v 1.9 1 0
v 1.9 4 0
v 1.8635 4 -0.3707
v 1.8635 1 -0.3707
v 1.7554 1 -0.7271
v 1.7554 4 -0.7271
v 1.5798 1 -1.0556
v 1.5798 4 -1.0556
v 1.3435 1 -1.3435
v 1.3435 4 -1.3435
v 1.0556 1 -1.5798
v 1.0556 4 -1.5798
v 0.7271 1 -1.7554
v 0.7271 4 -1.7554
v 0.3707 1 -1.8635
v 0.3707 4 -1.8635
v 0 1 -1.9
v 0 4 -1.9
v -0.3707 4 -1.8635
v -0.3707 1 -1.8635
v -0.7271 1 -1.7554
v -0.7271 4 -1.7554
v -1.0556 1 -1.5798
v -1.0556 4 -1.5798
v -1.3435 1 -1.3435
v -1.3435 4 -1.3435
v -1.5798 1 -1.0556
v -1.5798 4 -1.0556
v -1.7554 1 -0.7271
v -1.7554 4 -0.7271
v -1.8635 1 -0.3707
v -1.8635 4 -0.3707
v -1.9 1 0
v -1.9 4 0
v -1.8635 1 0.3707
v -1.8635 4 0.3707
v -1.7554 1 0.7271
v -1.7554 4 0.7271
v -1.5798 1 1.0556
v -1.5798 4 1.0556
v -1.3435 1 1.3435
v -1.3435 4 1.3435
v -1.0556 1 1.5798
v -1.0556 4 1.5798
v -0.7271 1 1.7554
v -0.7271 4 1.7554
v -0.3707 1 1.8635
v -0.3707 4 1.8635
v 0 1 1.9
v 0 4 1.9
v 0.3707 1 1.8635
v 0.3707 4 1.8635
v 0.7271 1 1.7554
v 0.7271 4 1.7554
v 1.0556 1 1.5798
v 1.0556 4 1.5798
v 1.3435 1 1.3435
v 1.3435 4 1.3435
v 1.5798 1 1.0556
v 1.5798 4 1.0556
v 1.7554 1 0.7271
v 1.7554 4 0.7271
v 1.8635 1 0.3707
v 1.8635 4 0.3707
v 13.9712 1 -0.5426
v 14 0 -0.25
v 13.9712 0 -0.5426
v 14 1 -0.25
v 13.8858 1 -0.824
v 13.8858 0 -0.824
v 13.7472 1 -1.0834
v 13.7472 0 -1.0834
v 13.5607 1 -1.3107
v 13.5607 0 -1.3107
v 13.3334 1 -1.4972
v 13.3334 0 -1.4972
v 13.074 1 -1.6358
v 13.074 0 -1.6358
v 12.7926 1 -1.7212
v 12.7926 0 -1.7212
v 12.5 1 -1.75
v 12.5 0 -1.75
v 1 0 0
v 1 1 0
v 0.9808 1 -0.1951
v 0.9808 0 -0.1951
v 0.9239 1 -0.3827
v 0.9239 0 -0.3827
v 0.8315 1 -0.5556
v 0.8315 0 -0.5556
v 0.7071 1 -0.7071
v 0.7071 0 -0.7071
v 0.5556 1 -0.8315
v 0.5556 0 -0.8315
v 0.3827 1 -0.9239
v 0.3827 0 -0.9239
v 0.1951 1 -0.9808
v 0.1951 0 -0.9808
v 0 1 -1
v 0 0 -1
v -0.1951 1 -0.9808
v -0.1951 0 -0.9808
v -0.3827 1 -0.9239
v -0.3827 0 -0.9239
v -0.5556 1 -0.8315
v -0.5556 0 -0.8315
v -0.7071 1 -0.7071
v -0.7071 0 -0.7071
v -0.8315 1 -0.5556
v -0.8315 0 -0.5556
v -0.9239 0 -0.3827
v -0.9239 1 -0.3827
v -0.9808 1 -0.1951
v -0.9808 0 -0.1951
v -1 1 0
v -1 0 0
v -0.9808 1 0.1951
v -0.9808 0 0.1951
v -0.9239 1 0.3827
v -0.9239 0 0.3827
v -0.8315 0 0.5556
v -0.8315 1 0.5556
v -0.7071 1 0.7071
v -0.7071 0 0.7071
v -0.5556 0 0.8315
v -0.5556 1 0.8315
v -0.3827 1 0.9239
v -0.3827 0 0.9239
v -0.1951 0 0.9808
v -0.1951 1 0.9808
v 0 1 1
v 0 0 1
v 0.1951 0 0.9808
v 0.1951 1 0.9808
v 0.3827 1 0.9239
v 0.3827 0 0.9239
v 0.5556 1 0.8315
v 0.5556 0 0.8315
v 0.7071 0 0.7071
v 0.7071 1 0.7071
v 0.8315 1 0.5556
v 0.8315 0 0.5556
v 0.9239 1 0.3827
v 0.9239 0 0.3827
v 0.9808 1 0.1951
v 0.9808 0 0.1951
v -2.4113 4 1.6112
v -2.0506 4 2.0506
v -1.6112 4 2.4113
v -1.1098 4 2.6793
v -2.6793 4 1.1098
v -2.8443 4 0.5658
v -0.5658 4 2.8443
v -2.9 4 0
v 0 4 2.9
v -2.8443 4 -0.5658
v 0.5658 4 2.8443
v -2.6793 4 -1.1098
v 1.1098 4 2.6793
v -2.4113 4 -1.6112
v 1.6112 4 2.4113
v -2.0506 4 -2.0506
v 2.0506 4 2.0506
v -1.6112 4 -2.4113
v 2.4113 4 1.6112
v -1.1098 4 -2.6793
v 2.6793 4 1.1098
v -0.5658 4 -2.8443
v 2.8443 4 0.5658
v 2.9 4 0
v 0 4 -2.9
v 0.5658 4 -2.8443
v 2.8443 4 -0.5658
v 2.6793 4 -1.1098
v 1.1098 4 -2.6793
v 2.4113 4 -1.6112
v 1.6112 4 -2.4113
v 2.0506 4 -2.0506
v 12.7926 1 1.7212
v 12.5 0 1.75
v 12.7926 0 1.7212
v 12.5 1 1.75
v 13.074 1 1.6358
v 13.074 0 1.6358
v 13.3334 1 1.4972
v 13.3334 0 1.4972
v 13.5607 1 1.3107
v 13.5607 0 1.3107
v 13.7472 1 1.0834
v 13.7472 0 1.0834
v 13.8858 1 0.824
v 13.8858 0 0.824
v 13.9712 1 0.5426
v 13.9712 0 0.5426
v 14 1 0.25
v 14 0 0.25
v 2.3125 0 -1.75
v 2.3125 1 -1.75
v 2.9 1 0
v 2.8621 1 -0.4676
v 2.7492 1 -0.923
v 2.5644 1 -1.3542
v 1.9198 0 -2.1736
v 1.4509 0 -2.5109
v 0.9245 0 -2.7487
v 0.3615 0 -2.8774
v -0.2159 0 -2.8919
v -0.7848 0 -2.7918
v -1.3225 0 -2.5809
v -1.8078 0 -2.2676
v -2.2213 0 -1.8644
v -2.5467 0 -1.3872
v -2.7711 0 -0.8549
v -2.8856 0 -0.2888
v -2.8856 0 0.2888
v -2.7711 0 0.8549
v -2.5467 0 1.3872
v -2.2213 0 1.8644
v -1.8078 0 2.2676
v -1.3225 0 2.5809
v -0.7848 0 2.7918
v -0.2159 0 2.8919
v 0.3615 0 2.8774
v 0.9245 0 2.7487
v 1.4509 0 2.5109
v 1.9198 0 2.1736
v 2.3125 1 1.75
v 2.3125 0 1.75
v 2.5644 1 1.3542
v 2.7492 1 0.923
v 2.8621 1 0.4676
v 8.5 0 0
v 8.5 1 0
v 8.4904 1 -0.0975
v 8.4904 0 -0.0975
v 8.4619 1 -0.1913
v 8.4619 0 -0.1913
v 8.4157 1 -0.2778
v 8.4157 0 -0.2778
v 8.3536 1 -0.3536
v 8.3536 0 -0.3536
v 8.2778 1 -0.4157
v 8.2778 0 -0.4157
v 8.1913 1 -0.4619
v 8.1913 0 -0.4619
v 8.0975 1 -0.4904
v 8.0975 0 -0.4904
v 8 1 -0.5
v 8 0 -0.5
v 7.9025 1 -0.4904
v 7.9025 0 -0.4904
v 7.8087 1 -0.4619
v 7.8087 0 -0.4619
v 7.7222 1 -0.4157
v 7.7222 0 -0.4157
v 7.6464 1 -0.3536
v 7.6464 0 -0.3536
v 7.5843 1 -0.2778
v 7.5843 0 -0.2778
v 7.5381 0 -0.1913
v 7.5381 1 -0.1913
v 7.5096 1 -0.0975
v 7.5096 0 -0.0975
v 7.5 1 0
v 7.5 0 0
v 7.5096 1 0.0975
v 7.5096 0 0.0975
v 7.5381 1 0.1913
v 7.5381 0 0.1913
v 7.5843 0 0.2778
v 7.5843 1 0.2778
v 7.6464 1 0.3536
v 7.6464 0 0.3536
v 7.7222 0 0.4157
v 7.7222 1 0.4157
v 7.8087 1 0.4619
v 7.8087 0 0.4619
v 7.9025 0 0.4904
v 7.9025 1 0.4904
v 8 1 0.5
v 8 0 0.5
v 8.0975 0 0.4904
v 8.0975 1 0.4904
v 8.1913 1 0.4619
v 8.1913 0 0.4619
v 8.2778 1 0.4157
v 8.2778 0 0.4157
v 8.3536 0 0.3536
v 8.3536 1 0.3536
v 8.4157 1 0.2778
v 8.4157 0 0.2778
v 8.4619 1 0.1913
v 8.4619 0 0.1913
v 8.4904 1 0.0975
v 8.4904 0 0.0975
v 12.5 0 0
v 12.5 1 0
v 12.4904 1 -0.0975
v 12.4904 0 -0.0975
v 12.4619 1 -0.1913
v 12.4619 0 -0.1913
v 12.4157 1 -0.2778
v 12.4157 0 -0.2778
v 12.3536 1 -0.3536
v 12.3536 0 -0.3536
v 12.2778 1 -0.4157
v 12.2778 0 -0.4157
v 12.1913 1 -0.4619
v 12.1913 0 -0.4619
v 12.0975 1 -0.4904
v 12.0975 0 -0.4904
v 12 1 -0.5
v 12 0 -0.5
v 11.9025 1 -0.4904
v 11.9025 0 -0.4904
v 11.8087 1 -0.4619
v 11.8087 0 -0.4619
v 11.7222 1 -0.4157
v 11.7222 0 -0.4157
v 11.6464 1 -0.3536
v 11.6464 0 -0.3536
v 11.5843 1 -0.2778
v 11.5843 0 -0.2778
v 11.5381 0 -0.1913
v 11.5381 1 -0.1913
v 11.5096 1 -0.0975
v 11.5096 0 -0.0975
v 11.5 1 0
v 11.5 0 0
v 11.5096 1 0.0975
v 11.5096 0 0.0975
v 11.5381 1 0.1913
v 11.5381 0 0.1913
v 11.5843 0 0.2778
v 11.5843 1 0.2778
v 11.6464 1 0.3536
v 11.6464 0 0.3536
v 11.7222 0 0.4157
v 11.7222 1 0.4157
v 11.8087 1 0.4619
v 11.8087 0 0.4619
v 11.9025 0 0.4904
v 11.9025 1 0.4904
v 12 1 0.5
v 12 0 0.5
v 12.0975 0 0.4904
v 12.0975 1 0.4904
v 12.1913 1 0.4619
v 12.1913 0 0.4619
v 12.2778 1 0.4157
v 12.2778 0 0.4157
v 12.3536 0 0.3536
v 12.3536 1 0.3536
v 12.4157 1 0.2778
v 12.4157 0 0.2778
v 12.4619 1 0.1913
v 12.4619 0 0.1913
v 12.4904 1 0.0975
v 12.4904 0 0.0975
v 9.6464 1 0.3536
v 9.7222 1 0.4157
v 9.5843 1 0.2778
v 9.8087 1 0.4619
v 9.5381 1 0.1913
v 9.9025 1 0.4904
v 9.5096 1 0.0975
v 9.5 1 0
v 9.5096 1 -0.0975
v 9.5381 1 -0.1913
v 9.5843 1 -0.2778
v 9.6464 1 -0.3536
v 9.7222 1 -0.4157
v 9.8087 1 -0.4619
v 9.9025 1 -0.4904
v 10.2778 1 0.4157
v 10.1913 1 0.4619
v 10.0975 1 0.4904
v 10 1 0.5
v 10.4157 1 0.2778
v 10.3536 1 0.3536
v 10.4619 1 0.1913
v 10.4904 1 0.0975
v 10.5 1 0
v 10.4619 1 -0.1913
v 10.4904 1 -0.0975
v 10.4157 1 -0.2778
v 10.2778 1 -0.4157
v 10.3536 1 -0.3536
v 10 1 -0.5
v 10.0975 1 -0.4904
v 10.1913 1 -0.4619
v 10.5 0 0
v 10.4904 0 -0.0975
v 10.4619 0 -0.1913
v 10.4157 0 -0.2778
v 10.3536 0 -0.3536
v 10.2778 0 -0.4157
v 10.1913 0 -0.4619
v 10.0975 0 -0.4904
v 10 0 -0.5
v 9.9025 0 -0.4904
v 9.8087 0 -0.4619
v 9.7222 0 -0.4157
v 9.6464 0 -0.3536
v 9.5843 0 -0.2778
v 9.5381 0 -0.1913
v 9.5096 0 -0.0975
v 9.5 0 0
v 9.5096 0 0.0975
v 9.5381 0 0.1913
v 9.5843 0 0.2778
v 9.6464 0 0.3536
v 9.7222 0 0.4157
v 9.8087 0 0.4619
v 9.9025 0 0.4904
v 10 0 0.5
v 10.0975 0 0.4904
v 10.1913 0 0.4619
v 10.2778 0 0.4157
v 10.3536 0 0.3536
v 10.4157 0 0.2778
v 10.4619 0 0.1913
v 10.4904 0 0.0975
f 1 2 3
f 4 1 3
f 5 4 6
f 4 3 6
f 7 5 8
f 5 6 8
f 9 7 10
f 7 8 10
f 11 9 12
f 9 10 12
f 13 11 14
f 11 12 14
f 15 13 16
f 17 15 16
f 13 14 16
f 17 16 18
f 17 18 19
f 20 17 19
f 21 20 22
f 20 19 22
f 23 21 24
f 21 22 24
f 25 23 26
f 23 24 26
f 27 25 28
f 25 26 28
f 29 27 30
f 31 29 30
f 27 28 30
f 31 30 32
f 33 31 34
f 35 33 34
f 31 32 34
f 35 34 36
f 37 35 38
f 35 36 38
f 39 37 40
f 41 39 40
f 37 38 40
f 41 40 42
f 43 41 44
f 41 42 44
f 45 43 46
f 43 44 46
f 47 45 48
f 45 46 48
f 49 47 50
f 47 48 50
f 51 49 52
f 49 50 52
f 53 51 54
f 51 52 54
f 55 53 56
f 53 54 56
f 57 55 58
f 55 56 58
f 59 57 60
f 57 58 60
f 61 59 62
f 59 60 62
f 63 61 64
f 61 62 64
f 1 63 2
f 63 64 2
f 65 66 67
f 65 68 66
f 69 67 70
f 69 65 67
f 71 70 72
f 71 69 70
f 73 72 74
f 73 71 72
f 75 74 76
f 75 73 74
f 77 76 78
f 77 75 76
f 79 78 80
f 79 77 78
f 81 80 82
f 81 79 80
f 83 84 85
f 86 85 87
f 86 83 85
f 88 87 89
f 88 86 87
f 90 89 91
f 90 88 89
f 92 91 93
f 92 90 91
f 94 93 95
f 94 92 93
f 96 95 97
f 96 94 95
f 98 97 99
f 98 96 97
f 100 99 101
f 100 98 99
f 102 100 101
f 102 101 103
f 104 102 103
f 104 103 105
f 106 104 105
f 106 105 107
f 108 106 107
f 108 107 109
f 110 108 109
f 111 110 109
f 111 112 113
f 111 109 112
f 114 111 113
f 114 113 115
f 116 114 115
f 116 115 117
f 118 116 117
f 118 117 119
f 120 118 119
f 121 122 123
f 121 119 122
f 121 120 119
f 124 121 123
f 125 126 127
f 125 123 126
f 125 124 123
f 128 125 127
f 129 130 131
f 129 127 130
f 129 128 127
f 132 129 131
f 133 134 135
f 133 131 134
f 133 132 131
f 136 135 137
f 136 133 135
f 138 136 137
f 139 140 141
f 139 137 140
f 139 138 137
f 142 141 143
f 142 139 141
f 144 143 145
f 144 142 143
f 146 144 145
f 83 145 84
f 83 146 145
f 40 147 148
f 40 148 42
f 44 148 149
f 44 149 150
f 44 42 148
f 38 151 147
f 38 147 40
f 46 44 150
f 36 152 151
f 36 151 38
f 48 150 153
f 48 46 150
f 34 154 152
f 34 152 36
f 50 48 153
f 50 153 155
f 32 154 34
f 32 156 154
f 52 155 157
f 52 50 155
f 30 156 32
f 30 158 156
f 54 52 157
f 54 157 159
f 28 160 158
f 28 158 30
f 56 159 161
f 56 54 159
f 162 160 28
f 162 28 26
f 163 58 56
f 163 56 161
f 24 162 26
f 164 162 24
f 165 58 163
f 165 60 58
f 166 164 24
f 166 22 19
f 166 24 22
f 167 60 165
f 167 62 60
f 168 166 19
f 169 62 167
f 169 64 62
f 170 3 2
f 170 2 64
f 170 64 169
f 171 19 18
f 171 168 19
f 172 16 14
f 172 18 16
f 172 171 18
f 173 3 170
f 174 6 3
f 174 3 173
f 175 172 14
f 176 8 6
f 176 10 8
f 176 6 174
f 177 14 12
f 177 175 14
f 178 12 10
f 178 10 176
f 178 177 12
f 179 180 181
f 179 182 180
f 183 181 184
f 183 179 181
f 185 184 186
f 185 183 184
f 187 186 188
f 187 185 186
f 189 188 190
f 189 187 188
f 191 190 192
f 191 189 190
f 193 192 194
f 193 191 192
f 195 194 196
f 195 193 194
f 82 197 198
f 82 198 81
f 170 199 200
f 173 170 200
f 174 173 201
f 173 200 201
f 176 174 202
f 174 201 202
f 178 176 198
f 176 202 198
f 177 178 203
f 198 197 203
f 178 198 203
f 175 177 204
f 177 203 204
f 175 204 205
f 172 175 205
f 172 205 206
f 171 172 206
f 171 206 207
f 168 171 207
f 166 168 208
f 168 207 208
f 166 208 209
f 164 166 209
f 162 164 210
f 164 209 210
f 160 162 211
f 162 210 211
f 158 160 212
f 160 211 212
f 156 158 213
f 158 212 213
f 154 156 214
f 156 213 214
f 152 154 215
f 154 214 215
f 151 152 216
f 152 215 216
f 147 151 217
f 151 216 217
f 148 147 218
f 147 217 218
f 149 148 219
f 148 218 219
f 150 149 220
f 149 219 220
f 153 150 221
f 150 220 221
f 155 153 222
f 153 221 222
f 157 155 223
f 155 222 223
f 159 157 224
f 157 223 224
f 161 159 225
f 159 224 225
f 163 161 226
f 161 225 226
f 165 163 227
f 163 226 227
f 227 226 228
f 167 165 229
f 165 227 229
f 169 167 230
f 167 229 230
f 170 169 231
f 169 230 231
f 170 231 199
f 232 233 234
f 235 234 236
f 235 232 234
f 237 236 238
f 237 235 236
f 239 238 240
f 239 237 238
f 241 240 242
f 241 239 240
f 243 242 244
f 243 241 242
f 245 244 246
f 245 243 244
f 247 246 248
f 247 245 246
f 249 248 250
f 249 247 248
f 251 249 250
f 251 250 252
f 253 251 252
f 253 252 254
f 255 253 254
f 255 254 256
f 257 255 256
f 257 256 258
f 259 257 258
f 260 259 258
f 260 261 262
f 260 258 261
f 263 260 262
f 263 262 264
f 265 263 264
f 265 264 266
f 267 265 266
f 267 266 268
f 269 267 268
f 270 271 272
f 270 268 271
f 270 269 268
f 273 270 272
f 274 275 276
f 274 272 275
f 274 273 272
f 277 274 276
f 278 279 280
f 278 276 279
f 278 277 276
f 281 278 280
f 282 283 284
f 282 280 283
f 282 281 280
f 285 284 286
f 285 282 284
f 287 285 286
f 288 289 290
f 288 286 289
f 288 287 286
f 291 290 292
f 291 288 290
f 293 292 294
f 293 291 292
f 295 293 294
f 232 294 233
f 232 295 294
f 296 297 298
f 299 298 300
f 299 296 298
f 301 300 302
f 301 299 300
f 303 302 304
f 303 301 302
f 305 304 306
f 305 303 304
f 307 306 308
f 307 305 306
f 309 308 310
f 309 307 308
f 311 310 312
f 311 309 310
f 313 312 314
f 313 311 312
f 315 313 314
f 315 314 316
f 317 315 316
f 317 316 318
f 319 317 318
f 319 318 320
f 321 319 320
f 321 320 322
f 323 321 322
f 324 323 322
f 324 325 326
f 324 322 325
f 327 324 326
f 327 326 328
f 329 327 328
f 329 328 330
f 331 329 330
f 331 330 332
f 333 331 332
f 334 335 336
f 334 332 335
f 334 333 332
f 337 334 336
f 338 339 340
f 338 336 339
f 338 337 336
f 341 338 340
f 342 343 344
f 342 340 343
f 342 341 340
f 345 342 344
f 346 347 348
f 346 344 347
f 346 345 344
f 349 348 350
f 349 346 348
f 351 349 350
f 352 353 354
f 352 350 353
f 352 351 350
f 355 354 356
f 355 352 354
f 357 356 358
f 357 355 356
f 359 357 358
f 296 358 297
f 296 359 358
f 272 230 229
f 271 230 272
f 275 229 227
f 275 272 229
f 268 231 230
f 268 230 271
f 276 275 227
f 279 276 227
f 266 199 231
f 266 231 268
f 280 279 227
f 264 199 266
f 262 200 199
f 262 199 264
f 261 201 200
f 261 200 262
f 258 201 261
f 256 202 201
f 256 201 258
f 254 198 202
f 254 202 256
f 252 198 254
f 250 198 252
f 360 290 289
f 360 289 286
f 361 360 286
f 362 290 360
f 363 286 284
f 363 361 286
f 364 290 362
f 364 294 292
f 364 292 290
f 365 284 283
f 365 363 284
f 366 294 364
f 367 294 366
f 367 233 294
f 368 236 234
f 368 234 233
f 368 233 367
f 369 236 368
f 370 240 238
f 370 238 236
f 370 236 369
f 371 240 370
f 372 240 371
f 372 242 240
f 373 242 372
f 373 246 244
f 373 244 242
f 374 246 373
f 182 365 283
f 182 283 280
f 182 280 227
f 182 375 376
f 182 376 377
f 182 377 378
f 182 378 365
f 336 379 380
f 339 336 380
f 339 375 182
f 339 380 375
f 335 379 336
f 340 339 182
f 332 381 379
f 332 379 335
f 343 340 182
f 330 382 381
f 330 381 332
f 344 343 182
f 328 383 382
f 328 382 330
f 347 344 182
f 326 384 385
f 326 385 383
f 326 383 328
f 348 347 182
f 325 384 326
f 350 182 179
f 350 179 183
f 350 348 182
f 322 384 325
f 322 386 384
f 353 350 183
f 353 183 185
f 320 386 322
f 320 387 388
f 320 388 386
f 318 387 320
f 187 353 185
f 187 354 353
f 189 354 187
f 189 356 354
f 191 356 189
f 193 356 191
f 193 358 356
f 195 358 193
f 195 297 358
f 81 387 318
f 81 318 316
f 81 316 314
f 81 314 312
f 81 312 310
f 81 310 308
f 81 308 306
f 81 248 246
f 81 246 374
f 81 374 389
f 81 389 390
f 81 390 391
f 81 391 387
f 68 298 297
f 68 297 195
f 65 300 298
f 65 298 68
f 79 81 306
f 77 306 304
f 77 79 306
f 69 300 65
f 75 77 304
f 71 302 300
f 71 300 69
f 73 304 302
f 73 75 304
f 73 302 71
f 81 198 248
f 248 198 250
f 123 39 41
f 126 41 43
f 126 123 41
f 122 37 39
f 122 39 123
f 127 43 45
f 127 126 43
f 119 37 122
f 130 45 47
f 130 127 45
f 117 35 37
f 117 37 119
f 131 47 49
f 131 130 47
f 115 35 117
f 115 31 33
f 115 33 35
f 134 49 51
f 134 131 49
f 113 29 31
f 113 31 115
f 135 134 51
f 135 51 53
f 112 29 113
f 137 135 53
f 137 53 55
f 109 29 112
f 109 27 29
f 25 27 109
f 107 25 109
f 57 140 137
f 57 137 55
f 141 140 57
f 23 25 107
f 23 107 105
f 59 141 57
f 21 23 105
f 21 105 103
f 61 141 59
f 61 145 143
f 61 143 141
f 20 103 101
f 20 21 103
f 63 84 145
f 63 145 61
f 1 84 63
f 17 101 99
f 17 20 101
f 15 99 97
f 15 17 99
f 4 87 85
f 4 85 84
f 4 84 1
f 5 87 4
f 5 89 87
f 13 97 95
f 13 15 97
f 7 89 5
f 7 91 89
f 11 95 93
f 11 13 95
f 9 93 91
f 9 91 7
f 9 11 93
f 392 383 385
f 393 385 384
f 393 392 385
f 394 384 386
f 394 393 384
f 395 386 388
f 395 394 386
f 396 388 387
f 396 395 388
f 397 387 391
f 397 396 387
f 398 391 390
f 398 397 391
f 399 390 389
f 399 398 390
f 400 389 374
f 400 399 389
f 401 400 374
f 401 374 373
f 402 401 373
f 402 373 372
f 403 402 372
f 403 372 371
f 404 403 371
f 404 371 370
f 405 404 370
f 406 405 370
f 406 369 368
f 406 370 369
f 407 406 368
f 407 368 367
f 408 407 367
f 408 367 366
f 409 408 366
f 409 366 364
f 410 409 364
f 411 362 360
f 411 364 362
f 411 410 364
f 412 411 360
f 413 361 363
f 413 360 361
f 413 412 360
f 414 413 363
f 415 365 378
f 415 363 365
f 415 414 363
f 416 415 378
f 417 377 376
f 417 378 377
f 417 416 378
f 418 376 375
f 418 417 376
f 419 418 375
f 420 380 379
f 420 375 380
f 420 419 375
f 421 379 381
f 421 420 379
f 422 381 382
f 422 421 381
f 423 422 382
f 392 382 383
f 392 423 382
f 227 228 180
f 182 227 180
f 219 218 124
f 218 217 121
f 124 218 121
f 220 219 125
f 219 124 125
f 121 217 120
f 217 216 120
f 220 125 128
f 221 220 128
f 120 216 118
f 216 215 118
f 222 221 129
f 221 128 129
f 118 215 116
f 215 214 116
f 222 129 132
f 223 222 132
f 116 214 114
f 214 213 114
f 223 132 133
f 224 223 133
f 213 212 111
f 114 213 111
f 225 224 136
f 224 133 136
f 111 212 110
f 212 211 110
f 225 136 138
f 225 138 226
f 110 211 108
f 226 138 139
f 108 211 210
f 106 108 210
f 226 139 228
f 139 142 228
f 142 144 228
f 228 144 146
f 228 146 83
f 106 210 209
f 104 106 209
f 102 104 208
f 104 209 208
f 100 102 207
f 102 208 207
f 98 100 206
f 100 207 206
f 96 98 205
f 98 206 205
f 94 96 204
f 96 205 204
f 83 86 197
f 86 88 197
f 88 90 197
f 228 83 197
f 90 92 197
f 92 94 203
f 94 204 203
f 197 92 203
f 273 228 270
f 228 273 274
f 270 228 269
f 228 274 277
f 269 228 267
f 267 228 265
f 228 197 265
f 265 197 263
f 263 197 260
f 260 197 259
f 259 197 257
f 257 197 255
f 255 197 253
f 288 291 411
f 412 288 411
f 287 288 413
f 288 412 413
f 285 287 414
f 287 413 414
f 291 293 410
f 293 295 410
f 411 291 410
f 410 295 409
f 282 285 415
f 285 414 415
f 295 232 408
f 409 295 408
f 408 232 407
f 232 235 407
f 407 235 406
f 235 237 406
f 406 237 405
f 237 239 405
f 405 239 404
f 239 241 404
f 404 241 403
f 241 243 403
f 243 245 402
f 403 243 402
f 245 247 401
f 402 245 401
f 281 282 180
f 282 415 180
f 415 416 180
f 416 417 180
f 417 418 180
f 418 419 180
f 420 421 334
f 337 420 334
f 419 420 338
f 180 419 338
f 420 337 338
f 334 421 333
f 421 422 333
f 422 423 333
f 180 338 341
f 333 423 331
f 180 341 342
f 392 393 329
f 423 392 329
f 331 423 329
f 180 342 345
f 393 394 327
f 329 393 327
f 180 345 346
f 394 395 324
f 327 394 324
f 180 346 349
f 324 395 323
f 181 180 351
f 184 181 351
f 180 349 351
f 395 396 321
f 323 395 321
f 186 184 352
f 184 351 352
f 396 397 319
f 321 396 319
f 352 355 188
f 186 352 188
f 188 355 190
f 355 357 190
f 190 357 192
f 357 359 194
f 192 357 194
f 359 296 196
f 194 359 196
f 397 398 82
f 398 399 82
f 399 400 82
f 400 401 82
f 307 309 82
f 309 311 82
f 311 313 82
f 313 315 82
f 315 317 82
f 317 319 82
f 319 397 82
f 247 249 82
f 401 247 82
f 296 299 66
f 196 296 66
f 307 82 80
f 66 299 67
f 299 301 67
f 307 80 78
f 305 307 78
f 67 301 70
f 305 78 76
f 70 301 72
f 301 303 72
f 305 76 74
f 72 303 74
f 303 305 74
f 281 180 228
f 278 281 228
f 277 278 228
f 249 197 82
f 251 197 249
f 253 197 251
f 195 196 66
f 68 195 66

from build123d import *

# Parameters (mm, degrees)
SKETCH_1_R          = 2.9
EXTRUDE_1_DEPTH     = 4
SKETCH_2_W          = 12.628096459
SKETCH_2_H          = 3.5
EXTRUDE_2_DEPTH     = 1
SKETCH_3_R          = 0.5
SKETCH_3_R_2        = 1
CUT_EXTRUDE_1_DEPTH = 5
FILLET_1_R          = 1.5
SKETCH_4_R          = 1.9
CUT_EXTRUDE_2_DEPTH = 3


with BuildPart() as part:
    # 草图1 → 凸台-拉伸1 (new body)
    with BuildSketch(Plane(origin=(0, 0, 0), x_dir=(1, 0, 0), z_dir=(0, 1, 0))):
        Circle(SKETCH_1_R)
    extrude(amount=EXTRUDE_1_DEPTH)

    # 草图2 → 凸台-拉伸2 (add)
    with BuildSketch(Plane(origin=(0, 0, 0), x_dir=(1, 0, 0), z_dir=(0, 1, 0))):
        with Locations((7.685951771, 0)):
            Rectangle(SKETCH_2_W, SKETCH_2_H)
    extrude(amount=EXTRUDE_2_DEPTH)

    # 草图3 → 切除-拉伸1 (cut, through all)
    with BuildSketch(Plane(origin=(0, 0, 0), x_dir=(1, 0, 0), z_dir=(0, 1, 0))):
        with Locations((8, 0)):
            Circle(SKETCH_3_R)
        with Locations((12, 0)):
            Circle(SKETCH_3_R)
        with Locations((10, 0)):
            Circle(SKETCH_3_R)
        Circle(SKETCH_3_R_2)
    extrude(amount=CUT_EXTRUDE_1_DEPTH, mode=Mode.SUBTRACT)

    # 圆角1
    fillet_1_edges = [part.edges().sort_by_distance(p)[0] for p in [
        (14, 0.5, -1.75),
        (14, 0.5, 1.75),
    ]]
    fillet(fillet_1_edges, radius=FILLET_1_R)

    # 草图4 → 切除-拉伸2 (cut)
    with BuildSketch(Plane(origin=(0, 4, 0), x_dir=(1, 0, 0), z_dir=(0, 1, 0))):
        Circle(SKETCH_4_R)
    extrude(amount=-CUT_EXTRUDE_2_DEPTH, mode=Mode.SUBTRACT)


solid = part.part
